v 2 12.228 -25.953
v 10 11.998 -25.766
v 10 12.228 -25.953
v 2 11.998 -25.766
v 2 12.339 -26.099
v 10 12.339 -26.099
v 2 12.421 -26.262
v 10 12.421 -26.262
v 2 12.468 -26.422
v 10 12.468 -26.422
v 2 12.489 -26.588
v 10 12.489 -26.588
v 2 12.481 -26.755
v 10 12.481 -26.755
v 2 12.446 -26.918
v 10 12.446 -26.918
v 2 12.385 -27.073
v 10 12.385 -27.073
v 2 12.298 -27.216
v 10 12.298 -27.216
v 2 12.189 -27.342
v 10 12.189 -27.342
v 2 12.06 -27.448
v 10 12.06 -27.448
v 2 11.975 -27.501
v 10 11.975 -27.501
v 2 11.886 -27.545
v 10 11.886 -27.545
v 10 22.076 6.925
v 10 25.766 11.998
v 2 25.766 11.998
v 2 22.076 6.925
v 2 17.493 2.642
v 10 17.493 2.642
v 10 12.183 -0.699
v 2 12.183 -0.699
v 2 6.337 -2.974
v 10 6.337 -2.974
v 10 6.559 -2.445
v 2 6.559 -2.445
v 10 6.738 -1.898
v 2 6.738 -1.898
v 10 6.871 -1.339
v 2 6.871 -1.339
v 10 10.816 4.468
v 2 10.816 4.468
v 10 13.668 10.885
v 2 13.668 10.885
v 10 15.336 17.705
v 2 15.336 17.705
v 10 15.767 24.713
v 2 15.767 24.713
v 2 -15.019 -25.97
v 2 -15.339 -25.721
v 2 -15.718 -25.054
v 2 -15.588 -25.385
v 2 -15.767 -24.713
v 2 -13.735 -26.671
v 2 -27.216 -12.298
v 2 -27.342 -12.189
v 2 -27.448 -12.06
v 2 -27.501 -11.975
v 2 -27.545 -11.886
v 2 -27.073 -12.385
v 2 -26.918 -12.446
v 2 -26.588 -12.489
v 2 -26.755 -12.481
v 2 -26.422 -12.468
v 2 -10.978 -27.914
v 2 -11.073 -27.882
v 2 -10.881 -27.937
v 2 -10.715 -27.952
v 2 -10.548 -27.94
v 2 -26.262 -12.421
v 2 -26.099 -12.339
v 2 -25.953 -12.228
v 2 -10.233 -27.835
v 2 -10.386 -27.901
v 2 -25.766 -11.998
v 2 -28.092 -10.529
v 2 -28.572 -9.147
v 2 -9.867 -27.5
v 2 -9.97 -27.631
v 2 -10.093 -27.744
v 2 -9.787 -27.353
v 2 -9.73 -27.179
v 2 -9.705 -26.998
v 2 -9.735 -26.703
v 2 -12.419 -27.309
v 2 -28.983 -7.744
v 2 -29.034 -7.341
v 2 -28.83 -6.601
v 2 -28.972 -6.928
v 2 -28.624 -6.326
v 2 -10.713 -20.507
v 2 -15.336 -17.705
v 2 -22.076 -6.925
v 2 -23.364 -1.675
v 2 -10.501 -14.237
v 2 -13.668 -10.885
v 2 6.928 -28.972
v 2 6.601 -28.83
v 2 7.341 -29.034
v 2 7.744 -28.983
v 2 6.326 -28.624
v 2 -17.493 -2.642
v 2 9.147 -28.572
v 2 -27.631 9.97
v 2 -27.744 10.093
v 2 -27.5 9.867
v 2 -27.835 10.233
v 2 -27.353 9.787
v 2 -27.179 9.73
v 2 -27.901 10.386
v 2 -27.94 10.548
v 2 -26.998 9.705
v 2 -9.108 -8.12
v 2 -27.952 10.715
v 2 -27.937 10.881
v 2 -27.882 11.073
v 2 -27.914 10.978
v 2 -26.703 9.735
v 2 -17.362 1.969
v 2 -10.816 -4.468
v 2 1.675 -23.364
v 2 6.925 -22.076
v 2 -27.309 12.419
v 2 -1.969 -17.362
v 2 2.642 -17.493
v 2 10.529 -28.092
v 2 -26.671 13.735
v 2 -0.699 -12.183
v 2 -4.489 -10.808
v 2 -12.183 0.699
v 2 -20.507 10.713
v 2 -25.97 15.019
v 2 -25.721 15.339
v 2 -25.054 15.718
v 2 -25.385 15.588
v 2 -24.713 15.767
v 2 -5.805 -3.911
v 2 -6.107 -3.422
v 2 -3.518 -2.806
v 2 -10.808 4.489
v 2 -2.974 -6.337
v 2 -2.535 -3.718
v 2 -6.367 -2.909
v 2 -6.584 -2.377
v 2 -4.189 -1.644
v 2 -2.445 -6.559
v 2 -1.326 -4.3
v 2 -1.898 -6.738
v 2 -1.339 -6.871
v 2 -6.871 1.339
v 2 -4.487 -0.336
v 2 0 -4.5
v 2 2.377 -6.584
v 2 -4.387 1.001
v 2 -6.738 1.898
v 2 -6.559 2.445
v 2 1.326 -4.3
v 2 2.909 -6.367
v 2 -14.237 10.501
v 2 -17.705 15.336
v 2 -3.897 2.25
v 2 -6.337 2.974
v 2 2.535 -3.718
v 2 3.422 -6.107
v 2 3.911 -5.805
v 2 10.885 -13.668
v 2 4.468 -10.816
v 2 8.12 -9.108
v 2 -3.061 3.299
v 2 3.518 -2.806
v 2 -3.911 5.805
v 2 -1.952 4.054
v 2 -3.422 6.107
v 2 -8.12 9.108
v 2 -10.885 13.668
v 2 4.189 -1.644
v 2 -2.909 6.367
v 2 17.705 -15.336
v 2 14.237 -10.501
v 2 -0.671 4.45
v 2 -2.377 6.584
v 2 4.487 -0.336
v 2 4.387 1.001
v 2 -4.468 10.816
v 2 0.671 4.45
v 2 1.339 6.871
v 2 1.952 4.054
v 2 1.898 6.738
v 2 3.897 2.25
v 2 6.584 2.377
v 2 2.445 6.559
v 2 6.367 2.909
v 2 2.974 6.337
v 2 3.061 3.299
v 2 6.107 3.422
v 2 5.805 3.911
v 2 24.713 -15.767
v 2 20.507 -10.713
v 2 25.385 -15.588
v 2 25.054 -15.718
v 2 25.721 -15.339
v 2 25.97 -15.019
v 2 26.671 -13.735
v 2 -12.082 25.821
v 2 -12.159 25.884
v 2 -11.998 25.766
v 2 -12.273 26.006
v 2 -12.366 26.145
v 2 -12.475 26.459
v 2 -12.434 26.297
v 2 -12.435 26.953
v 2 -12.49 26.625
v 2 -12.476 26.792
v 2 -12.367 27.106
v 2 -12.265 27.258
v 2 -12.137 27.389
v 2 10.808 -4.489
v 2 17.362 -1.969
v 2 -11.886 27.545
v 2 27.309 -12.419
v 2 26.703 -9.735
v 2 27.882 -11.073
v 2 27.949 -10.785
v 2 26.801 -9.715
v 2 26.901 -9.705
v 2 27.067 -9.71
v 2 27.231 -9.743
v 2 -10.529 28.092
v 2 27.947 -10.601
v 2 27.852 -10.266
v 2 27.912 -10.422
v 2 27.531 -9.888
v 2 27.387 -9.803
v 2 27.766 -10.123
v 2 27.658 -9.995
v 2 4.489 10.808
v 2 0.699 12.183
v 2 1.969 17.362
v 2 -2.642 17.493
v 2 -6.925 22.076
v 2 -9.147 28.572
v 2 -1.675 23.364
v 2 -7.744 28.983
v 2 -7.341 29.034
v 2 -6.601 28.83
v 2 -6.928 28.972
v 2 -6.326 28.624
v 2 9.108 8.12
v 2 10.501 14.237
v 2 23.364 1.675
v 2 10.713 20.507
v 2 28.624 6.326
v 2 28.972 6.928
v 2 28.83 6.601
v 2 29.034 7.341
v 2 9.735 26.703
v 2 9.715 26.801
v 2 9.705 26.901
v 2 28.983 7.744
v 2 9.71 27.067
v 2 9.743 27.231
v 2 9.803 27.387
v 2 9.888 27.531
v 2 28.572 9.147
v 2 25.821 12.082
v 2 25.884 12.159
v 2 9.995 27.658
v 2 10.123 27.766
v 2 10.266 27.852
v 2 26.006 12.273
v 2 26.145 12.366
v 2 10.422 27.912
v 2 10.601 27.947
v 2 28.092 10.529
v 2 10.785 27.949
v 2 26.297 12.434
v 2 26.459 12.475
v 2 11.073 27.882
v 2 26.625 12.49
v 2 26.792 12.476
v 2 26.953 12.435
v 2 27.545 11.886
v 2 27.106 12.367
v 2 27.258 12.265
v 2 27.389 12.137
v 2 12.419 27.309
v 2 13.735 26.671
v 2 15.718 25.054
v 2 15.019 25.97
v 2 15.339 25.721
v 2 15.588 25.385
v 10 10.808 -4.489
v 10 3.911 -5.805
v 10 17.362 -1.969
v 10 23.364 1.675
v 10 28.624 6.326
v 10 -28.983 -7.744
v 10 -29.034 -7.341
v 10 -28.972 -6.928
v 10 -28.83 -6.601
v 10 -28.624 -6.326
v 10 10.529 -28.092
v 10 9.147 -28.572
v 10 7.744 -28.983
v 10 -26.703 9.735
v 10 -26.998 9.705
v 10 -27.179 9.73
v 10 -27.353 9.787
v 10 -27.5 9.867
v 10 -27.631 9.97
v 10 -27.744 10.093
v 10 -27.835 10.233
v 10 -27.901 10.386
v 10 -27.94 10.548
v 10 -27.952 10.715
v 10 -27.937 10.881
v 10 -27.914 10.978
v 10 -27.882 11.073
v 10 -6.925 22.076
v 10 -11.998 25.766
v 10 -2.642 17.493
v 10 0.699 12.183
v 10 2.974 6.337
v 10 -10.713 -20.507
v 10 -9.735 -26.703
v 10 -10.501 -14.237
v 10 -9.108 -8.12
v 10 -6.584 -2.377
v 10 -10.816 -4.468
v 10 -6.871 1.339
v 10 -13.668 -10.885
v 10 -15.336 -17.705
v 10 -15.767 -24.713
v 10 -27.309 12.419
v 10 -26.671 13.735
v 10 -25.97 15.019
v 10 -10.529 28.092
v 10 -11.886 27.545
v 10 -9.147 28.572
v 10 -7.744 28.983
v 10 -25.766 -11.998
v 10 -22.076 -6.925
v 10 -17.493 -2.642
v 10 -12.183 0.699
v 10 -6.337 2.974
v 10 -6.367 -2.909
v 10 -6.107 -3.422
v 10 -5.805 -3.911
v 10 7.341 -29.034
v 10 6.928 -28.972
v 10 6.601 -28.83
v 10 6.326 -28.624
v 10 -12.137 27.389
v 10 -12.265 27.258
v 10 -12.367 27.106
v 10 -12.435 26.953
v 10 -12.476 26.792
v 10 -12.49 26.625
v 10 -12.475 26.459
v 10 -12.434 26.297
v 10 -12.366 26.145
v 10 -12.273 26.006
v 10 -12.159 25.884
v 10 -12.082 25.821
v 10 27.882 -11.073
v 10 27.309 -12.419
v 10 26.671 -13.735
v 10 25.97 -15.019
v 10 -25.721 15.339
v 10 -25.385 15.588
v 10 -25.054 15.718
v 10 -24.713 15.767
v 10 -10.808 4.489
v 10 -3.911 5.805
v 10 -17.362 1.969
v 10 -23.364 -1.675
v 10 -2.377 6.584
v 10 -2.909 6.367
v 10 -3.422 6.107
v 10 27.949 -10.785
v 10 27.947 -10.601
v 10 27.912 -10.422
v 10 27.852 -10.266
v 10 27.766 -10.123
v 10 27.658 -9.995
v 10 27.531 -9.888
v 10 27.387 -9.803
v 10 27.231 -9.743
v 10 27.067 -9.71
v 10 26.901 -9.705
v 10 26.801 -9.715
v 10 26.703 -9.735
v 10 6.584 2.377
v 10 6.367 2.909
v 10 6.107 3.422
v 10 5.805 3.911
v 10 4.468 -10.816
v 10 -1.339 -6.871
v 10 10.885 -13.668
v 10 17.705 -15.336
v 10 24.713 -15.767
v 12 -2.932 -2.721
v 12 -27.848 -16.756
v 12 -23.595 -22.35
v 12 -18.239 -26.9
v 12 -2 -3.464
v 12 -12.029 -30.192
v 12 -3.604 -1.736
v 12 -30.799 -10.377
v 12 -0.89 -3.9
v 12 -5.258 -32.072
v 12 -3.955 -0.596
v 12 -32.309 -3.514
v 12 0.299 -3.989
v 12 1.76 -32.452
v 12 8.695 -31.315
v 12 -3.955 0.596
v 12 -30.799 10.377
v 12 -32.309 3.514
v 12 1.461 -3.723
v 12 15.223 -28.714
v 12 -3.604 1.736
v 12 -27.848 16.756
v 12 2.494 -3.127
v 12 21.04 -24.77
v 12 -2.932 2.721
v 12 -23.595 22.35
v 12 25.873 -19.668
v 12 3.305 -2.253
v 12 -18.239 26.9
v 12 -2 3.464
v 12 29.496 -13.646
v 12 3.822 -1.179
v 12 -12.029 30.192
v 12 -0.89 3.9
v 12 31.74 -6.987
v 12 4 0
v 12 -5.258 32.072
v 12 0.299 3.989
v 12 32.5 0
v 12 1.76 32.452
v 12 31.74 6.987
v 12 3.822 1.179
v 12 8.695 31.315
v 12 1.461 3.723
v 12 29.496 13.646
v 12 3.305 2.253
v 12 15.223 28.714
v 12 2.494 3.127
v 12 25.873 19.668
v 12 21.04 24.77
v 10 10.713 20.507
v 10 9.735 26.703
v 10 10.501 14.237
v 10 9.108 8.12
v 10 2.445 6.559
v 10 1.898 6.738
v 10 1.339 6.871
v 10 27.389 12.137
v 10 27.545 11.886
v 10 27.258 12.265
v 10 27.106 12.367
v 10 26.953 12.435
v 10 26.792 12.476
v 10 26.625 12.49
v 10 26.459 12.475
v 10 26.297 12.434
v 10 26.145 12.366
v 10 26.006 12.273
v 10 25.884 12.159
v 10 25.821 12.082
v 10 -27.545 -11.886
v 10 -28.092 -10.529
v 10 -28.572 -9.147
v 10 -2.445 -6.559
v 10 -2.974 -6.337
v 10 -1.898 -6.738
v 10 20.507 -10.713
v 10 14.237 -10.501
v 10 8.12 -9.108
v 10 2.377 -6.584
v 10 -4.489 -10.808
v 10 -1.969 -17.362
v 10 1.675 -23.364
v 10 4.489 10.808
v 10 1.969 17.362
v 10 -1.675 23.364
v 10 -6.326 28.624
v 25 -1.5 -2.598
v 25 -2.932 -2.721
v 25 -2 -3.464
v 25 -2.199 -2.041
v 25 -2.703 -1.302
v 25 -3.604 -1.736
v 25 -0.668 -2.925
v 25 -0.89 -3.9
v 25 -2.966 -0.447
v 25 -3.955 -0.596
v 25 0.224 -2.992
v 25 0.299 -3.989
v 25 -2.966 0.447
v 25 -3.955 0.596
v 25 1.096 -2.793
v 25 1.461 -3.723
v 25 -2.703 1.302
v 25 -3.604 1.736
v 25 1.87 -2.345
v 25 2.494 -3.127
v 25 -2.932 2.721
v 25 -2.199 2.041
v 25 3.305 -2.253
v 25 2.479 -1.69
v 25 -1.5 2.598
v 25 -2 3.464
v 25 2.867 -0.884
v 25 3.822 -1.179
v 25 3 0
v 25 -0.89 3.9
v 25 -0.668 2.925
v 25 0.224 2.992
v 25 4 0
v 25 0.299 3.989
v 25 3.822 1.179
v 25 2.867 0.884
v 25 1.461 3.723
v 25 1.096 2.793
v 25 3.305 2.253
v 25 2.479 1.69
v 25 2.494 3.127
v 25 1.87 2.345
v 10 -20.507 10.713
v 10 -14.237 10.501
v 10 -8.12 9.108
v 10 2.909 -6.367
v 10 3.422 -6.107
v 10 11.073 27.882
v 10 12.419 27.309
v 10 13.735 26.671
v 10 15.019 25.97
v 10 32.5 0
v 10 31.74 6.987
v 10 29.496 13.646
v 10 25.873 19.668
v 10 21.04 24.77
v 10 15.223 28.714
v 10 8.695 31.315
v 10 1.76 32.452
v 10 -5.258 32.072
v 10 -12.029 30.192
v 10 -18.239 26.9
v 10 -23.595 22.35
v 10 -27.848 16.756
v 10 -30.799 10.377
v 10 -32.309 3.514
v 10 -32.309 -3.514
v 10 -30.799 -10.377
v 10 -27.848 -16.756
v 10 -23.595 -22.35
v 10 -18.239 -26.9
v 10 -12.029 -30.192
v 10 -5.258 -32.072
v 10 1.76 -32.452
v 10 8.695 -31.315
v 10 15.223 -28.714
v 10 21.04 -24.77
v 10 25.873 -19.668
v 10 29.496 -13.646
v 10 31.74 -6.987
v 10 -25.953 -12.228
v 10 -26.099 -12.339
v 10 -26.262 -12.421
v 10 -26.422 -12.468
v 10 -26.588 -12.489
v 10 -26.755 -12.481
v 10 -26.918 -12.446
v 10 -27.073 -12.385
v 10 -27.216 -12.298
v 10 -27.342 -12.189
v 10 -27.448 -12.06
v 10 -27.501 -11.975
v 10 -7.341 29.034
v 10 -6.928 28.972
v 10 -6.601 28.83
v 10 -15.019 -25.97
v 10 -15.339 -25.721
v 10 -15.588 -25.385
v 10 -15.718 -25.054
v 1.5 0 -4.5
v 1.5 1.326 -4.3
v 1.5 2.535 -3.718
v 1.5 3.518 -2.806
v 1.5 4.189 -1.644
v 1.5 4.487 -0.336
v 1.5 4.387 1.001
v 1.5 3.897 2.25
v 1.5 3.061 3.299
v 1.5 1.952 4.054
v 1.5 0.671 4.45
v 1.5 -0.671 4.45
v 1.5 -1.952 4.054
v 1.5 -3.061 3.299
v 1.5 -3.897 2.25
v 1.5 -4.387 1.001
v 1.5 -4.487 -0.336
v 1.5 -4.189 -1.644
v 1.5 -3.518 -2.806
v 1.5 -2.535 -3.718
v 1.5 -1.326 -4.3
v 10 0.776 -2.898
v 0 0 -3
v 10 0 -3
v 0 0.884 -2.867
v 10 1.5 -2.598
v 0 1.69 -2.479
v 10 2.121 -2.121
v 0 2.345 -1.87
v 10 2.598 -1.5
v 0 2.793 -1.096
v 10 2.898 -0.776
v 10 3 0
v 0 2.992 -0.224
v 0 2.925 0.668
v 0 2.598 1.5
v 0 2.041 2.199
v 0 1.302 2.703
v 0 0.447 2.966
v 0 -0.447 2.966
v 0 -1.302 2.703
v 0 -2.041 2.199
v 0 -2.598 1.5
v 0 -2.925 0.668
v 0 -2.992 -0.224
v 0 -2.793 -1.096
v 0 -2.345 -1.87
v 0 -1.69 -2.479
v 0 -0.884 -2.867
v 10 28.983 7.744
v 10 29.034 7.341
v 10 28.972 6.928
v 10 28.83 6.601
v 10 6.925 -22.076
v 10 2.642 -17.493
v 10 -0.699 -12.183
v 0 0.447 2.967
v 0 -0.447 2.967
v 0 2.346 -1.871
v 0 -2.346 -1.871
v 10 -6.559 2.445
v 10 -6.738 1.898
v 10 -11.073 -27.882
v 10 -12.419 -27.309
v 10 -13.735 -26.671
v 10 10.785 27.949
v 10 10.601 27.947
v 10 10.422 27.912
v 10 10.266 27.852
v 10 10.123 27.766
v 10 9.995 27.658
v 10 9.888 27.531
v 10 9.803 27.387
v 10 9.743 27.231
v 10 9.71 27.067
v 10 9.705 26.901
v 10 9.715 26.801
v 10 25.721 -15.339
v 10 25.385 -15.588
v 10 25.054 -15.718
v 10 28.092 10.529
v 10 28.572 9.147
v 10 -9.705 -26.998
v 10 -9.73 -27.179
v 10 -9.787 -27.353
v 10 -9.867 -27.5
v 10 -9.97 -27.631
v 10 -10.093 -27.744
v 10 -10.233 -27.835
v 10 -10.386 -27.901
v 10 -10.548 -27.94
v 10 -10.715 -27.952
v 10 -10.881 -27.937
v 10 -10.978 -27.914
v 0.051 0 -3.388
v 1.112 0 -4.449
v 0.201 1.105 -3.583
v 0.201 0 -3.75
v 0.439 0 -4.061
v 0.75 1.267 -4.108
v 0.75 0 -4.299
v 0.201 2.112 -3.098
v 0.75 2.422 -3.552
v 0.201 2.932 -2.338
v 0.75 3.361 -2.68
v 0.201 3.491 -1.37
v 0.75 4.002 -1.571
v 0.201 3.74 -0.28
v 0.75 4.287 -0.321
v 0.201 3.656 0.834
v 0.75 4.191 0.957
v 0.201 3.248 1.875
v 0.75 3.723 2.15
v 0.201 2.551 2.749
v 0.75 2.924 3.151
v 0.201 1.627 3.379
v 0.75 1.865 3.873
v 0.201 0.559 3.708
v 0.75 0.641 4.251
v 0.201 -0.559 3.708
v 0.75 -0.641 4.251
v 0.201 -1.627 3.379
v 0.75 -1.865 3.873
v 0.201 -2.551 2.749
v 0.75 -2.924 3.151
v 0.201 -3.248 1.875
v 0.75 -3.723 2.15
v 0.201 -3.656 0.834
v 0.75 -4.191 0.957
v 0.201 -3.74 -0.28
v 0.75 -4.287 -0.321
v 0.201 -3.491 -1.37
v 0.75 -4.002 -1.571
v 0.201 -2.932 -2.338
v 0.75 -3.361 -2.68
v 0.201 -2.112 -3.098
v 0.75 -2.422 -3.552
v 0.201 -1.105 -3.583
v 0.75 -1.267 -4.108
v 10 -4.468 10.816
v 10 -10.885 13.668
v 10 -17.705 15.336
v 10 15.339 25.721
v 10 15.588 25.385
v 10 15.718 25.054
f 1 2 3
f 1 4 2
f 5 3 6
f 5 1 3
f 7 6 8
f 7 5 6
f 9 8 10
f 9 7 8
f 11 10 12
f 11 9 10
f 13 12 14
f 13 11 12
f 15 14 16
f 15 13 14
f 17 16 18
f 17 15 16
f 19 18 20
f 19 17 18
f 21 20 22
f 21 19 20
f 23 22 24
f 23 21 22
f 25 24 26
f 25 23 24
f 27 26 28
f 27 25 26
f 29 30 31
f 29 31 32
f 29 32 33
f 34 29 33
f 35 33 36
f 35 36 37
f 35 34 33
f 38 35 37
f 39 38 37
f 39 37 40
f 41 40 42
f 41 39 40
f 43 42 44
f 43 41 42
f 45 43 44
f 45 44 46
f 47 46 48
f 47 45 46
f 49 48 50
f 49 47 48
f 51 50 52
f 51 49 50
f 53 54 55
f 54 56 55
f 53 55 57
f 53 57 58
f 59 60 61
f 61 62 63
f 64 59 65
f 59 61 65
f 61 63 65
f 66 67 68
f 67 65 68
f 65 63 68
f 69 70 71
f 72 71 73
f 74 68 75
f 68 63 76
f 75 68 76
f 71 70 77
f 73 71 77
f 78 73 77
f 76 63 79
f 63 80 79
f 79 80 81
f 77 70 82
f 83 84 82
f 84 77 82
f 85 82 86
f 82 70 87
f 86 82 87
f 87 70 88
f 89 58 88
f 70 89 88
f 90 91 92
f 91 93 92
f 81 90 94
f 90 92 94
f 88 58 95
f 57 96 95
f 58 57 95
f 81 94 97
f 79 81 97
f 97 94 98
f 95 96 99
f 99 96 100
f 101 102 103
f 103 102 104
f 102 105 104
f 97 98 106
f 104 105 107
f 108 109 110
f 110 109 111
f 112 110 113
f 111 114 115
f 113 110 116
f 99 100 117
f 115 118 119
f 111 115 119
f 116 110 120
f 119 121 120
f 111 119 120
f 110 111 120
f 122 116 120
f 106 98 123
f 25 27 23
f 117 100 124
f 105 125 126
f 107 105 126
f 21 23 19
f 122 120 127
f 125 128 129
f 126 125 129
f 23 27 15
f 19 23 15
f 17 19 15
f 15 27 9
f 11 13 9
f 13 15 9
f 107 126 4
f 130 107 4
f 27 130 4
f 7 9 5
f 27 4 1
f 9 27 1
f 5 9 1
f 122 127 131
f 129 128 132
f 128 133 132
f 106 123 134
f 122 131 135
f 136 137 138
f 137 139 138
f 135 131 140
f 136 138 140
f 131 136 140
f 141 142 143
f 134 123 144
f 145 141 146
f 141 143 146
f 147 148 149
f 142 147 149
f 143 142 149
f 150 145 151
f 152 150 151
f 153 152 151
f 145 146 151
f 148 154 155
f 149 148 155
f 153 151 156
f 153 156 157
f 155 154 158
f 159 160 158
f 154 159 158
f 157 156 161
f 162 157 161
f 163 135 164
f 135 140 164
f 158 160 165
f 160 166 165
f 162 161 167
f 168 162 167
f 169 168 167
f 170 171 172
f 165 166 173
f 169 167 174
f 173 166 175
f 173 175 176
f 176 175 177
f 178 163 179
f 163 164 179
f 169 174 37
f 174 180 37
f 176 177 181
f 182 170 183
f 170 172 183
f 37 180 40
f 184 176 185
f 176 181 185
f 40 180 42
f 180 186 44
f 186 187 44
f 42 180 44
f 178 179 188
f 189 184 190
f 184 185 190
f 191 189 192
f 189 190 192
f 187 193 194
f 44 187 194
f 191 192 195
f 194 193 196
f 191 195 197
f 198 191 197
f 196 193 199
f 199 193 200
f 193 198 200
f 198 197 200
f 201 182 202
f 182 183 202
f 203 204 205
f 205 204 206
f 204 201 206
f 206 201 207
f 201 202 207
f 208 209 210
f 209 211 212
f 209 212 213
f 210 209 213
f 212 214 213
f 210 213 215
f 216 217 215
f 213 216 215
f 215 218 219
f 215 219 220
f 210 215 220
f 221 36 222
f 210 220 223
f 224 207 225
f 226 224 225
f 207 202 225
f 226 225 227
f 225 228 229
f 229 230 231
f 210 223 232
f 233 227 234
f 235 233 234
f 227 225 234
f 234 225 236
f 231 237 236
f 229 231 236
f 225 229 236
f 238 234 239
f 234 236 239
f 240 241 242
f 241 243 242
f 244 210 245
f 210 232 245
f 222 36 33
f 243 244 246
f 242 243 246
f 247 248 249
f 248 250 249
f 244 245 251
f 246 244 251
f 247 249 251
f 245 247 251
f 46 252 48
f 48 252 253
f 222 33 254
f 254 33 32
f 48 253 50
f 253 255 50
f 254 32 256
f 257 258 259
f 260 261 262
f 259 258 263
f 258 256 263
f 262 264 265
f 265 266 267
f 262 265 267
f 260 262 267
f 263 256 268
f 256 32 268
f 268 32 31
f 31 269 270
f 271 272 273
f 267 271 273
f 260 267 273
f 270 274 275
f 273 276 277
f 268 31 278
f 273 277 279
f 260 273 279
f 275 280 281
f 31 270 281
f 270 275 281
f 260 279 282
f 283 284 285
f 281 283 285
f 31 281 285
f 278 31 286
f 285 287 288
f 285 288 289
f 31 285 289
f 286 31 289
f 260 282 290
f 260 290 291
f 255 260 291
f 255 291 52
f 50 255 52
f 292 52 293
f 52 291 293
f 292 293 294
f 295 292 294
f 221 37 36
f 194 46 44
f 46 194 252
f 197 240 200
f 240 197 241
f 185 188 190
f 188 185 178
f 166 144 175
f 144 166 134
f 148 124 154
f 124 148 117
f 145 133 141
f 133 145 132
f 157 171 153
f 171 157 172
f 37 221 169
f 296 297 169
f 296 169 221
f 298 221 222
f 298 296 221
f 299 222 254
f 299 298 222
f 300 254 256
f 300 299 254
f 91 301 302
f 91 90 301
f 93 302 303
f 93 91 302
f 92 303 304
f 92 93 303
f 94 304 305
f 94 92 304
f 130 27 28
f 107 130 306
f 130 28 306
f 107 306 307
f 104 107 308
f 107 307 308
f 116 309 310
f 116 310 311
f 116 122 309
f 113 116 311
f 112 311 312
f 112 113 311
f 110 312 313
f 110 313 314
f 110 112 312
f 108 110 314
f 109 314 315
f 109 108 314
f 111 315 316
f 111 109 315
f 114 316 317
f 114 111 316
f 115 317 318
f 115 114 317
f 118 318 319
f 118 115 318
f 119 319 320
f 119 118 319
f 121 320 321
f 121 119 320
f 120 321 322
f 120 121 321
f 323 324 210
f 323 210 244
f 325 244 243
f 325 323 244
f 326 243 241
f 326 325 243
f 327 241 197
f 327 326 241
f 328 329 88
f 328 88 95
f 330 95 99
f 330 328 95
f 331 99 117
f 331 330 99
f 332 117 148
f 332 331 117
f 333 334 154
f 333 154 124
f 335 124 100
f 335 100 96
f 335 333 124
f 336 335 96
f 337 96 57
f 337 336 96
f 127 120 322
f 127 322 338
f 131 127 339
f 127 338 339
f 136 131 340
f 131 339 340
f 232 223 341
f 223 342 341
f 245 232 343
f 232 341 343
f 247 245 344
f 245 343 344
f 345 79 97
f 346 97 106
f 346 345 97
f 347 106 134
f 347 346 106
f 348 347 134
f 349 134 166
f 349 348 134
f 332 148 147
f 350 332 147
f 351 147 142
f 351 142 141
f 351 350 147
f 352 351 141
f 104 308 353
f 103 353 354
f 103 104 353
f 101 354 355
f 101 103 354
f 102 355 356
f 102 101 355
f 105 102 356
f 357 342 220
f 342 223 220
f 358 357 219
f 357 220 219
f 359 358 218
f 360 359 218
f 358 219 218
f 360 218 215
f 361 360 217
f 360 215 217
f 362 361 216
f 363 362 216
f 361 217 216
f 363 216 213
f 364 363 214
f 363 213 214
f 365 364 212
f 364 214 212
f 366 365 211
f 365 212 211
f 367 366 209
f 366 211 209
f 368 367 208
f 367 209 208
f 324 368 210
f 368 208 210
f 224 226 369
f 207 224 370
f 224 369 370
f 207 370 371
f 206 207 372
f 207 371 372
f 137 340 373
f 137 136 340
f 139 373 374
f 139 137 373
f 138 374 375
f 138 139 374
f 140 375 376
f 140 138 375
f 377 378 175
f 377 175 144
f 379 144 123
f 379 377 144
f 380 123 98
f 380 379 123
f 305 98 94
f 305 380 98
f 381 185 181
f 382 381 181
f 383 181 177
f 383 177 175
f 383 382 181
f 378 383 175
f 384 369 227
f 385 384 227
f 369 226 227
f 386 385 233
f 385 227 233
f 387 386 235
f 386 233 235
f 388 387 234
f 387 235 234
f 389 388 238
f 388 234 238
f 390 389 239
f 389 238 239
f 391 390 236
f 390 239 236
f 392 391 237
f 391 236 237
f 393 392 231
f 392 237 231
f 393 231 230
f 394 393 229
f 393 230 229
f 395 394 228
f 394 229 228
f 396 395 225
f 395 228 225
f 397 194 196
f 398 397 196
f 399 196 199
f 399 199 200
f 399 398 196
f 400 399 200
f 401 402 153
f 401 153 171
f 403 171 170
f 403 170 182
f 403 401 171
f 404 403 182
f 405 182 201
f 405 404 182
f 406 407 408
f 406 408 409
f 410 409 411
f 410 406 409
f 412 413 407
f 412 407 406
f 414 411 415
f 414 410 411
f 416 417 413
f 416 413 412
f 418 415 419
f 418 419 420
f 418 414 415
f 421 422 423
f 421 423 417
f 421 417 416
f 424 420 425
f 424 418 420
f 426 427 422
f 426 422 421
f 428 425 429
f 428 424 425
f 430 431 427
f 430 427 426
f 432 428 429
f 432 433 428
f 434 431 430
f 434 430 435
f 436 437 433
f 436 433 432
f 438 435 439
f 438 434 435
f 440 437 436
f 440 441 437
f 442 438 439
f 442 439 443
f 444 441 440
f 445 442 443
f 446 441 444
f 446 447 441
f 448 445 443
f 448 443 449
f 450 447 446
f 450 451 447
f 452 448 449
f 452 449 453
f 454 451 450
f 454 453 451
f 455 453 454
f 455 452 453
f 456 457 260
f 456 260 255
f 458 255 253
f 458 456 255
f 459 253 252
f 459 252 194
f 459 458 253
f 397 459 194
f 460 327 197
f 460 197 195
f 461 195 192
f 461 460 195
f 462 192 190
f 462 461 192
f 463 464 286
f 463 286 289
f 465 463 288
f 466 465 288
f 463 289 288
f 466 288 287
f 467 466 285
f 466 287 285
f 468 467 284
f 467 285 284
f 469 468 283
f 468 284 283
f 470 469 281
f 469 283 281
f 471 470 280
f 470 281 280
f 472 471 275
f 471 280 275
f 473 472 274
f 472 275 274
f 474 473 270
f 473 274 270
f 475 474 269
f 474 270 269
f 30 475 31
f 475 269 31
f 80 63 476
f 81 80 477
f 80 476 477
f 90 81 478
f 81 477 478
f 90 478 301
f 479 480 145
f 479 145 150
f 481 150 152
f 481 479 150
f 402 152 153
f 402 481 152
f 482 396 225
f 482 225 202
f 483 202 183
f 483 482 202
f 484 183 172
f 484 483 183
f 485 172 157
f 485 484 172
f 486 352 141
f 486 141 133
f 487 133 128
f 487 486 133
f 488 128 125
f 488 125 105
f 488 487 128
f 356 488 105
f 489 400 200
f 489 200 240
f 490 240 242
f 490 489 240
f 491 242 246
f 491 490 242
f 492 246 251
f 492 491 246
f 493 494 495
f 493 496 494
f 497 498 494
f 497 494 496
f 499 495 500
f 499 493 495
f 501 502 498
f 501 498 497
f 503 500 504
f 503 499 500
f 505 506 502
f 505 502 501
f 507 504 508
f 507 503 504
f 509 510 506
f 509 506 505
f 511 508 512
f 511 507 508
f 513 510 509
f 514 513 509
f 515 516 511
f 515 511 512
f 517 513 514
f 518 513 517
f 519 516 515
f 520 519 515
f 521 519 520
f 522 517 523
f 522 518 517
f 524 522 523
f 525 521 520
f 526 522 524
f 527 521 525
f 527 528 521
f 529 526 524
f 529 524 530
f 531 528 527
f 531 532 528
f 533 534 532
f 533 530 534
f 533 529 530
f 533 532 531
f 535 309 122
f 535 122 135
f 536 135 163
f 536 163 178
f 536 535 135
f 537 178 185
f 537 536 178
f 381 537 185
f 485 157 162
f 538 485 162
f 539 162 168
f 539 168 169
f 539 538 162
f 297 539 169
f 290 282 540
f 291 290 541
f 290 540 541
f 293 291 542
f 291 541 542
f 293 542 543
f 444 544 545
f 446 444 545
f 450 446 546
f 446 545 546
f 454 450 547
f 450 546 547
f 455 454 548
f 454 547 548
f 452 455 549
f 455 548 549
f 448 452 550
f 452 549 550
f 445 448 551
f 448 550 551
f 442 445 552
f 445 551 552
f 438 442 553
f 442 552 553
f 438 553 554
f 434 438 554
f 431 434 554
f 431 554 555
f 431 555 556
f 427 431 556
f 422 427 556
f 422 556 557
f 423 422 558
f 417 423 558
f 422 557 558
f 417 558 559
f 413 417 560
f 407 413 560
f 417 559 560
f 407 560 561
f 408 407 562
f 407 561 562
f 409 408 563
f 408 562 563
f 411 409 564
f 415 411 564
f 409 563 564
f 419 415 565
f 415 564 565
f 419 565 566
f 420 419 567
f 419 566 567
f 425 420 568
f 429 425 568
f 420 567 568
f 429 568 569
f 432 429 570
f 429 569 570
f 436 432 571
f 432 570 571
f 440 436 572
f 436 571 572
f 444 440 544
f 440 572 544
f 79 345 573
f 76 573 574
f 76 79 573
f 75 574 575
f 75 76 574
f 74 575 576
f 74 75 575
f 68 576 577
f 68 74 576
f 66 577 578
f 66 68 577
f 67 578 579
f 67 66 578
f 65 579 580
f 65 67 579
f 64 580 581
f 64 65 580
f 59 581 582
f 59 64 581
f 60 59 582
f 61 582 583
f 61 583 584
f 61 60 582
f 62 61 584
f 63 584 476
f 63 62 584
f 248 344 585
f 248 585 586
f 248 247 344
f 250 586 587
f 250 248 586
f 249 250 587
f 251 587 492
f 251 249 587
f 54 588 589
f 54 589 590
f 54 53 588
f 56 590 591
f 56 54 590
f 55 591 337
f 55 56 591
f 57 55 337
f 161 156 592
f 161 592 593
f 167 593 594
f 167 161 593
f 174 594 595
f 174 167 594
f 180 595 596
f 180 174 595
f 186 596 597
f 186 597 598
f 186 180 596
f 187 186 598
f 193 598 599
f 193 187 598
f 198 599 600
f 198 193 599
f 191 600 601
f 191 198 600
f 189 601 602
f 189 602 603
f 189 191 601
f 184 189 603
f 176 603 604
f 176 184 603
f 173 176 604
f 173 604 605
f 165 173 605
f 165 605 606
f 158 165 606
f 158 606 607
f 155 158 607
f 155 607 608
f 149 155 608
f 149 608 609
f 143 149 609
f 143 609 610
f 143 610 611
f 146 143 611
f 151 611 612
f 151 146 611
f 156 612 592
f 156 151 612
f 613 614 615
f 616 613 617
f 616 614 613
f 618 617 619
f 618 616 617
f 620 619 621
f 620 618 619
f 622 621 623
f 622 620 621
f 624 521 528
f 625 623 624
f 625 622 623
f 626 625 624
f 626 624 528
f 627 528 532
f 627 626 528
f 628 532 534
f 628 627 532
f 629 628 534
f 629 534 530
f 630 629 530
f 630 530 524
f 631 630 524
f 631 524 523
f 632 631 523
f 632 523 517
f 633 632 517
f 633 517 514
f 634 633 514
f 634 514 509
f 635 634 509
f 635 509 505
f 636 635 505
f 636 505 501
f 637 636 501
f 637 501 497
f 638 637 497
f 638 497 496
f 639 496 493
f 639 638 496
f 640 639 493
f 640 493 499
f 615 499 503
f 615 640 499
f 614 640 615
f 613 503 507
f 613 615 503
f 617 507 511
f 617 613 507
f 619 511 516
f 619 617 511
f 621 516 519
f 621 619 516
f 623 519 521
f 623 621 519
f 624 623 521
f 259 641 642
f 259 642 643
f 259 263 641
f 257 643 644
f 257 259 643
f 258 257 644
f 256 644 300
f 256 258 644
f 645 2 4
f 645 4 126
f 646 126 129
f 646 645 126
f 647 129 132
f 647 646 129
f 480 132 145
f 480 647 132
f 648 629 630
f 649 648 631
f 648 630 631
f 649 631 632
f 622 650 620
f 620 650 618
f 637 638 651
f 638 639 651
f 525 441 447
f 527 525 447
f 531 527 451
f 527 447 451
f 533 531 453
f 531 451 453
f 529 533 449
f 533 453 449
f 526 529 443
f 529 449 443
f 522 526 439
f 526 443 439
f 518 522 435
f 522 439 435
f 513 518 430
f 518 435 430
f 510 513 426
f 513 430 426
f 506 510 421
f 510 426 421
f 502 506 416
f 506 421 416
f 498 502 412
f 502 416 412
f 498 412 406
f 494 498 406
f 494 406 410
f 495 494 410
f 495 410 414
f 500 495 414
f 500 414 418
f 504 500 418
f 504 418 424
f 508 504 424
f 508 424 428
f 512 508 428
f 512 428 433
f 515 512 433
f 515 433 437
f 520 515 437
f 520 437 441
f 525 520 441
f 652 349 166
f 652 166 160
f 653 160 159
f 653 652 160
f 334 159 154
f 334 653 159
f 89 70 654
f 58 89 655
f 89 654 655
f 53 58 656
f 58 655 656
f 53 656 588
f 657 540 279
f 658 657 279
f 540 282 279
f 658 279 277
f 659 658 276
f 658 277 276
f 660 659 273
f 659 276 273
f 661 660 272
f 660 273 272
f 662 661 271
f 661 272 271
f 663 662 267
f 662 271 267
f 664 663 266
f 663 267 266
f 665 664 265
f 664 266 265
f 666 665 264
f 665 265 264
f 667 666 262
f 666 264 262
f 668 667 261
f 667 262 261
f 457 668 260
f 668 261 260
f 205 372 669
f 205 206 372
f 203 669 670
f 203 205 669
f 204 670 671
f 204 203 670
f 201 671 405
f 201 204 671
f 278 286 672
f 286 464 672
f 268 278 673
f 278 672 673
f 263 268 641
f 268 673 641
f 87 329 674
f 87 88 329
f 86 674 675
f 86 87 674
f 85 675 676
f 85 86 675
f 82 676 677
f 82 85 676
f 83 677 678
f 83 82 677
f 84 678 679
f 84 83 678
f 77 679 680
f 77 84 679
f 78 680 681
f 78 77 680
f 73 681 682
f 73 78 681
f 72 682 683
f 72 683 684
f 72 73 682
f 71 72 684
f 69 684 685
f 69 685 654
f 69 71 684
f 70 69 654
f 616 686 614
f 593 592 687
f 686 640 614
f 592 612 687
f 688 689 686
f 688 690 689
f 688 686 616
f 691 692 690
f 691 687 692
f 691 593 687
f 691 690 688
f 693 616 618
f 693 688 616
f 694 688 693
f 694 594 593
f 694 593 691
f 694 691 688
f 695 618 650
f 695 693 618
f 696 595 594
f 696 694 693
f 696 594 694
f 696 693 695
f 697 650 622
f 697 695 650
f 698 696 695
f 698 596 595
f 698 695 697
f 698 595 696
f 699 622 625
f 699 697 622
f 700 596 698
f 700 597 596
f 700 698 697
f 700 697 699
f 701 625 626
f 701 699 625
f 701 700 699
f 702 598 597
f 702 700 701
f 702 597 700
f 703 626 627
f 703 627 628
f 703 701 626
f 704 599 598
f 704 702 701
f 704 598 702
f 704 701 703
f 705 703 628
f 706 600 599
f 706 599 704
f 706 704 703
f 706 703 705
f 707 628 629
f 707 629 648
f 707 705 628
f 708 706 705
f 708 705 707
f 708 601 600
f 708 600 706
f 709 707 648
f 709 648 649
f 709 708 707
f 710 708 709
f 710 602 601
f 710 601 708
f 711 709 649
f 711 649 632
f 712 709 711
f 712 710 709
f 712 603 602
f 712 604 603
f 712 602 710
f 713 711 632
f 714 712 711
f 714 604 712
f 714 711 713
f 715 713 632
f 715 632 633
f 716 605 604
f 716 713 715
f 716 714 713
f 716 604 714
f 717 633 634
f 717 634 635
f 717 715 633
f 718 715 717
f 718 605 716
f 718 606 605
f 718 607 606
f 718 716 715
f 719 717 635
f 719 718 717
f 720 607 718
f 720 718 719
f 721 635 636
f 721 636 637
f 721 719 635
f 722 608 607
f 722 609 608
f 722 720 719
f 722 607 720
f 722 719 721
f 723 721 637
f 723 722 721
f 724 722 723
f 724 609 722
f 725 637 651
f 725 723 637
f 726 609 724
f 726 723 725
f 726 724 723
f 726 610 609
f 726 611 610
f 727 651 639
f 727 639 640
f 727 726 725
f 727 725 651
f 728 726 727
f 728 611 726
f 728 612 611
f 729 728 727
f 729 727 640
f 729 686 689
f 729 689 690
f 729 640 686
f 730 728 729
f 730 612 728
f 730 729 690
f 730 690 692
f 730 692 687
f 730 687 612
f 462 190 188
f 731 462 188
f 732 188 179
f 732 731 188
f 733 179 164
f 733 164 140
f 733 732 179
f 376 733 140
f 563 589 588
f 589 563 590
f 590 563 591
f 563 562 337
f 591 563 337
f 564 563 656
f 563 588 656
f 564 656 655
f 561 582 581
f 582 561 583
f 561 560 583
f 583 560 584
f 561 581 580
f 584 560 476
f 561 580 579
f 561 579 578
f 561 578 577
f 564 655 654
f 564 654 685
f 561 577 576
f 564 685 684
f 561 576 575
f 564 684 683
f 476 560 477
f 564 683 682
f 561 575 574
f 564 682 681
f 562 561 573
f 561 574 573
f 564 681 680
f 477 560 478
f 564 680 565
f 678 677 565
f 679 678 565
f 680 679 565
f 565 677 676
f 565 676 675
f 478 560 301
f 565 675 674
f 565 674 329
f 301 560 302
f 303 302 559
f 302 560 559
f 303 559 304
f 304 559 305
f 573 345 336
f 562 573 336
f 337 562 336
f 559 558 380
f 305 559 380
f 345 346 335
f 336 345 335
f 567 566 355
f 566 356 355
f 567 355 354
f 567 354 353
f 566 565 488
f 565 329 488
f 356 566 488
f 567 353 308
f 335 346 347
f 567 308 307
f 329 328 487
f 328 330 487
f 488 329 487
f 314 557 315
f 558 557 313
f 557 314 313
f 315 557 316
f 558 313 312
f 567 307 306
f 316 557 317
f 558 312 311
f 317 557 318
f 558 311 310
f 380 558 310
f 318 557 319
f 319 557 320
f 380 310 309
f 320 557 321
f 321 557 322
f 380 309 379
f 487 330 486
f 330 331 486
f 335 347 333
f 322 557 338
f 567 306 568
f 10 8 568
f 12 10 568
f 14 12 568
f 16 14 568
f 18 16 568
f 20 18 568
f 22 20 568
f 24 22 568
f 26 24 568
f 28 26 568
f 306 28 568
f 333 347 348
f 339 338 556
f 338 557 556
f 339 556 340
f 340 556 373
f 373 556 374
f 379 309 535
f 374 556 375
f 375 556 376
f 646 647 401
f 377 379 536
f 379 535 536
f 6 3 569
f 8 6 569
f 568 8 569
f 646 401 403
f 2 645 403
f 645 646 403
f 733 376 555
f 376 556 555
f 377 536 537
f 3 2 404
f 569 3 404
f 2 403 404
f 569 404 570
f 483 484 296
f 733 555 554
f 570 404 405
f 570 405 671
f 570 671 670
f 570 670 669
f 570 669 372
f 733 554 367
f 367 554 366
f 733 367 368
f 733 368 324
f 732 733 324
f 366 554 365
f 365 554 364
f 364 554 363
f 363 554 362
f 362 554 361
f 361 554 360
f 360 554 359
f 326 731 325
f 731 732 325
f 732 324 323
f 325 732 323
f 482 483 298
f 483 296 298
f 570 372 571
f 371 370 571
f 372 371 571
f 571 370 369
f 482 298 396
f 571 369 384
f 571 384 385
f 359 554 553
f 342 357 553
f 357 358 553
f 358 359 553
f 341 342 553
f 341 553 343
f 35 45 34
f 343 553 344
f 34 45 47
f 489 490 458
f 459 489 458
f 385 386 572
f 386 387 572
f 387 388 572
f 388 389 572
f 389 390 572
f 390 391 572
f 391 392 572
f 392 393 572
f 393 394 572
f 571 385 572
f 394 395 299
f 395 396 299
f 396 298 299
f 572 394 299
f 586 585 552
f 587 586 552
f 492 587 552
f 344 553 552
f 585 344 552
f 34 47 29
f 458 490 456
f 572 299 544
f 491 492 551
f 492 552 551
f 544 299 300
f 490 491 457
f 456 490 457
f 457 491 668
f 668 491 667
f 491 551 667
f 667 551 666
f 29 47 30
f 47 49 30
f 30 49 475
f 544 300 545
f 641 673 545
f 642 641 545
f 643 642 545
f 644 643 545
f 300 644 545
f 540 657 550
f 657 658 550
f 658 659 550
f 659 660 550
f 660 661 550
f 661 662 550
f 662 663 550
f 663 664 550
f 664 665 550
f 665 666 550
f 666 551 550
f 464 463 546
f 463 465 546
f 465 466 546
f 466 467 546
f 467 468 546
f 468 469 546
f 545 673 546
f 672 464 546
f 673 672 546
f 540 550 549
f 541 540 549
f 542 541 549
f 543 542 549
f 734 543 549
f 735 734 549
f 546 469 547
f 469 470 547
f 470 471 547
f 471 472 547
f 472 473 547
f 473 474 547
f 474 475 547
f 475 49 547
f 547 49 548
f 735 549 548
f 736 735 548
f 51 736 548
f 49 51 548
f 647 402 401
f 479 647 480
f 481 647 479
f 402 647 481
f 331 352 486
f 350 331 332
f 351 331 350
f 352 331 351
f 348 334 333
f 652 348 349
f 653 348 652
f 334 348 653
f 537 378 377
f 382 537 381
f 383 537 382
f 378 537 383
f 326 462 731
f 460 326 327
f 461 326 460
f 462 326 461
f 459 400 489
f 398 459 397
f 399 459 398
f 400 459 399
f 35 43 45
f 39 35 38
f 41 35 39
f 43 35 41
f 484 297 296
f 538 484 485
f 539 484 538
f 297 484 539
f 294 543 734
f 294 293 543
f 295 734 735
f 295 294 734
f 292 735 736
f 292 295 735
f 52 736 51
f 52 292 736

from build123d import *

# Parameters (mm, degrees)
SKETCH3_W           = 10
SKETCH3_H           = 30
SKETCH4_R           = 3
CUT_EXTRUDE2_DEPTH  = 10
CUT_EXTRUDE3_START  = 2
SKETCH5_R           = 30
SKETCH5_R_2         = 4.5
CUT_EXTRUDE3_DEPTH  = 2
FILLET2_R           = 1.5
CUT_EXTRUDE6_START  = -8
CUT_EXTRUDE6_DEPTH  = 8
FILLET3_R           = 1.5
FILLET4_R           = 1
SKETCH11_R          = 32.5
SKETCH11_R_2        = 3
BOSS_EXTRUDE4_DEPTH = 2
SKETCH12_R          = 4
SKETCH12_R_2        = 3
BOSS_EXTRUDE5_DEPTH = 15


with BuildPart() as part:
    # Sketch3 → Revolve3 (revolve)
    with BuildSketch(Plane.XY):
        with Locations((5, 15)):
            Rectangle(SKETCH3_W, SKETCH3_H)
    revolve(axis=Axis((10, 0, 0), (-1, 0, 0)))

    # Sketch4 → Cut-Extrude2 (cut)
    with BuildSketch(Plane(origin=(0, 0, 0), x_dir=(0, 0, -1), z_dir=(1, 0, 0))):
        Circle(SKETCH4_R)
    extrude(amount=CUT_EXTRUDE2_DEPTH, mode=Mode.SUBTRACT)

    # Sketch5 → Cut-Extrude3 (cut)
    with BuildSketch(Plane(origin=(0, 0, 0), x_dir=(0, 0, -1), z_dir=(1, 0, 0)).offset(CUT_EXTRUDE3_START)):
        with Locations(Location((0, 0, 0), (0, 0, 90))):
            Circle(SKETCH5_R)
        Circle(SKETCH5_R_2, mode=Mode.SUBTRACT)
    extrude(amount=-CUT_EXTRUDE3_DEPTH, mode=Mode.SUBTRACT)

    # Fillet2
    fillet2_edges = [part.edges().sort_by_distance(p)[0] for p in [
        (0, 0, 4.5),
    ]]
    fillet(fillet2_edges, radius=FILLET2_R - 0.0001)  # a hair under: the kernel refuses the full size

    # Sketch6 → Cut-Extrude6 (cut)
    with BuildSketch(Plane.ZY.offset(-2).offset(CUT_EXTRUDE6_START)):
        with BuildLine():
            ThreePointArc((-3.911197191, -5.805388577), (-17.732937141, -1.783831627), (-29.187621061, 6.934174556))
            ThreePointArc((-29.187621061, 6.934174556), (-29.97689762, -1.177118976), (-28.554011024, -9.201546306))
            ThreePointArc((-28.554011024, -9.201546306), (-15.193906429, -10.611164811), (-2.377494131, -6.583883478))
            ThreePointArc((-2.377494131, -6.583883478), (-3.168347079, -6.241920921), (-3.911197191, -5.805388577))
        make_face()
        with BuildLine():
            ThreePointArc((-6.870663687, -1.339395574), (-13.800439543, 11.277720662), (-15.735562929, 25.54196663))
            ThreePointArc((-15.735562929, 25.54196663), (-22.029216396, 20.364518776), (-26.697210616, 13.684259035))
            ThreePointArc((-26.697210616, 13.684259035), (-18.246940863, 3.240487675), (-6.336650876, -2.974366432))
            ThreePointArc((-6.336650876, -2.974366432), (-6.654064316, -2.173344906), (-6.870663687, -1.339395574))
        make_face()
        with BuildLine():
            ThreePointArc((-25.54196663, -15.735562929), (-20.364518776, -22.029216396), (-13.684259035, -26.697210616))
            ThreePointArc((-13.684259035, -26.697210616), (-3.240487675, -18.246940863), (2.974366432, -6.336650876))
            ThreePointArc((2.974366432, -6.336650876), (2.173344906, -6.654064316), (1.339395574, -6.870663687))
            ThreePointArc((1.339395574, -6.870663687), (-11.277720662, -13.800439543), (-25.54196663, -15.735562929))
        make_face()
        with BuildLine():
            ThreePointArc((-6.934174556, -29.187621061), (1.177118976, -29.97689762), (9.201546306, -28.554011024))
            ThreePointArc((9.201546306, -28.554011024), (10.611164811, -15.193906429), (6.583883478, -2.377494131))
            ThreePointArc((6.583883478, -2.377494131), (6.241920921, -3.168347079), (5.805388577, -3.911197191))
            ThreePointArc((5.805388577, -3.911197191), (1.783831627, -17.732937141), (-6.934174556, -29.187621061))
        make_face()
        with BuildLine():
            ThreePointArc((15.735562929, -25.54196663), (22.029216396, -20.364518776), (26.697210616, -13.684259035))
            ThreePointArc((26.697210616, -13.684259035), (18.246940863, -3.240487675), (6.336650876, 2.974366432))
            ThreePointArc((6.336650876, 2.974366432), (6.654064316, 2.173344906), (6.870663687, 1.339395574))
            ThreePointArc((6.870663687, 1.339395574), (13.800439543, -11.277720662), (15.735562929, -25.54196663))
        make_face()
        with BuildLine():
            ThreePointArc((29.187621061, -6.934174556), (29.796213114, -3.49079992), (30, 0))
            ThreePointArc((30, 0), (29.636298105, 4.657234655), (28.554011024, 9.201546306))
            ThreePointArc((28.554011024, 9.201546306), (15.193906429, 10.611164811), (2.377494131, 6.583883478))
            ThreePointArc((2.377494131, 6.583883478), (3.168347079, 6.241920921), (3.911197191, 5.805388577))
            ThreePointArc((3.911197191, 5.805388577), (17.732937141, 1.783831627), (29.187621061, -6.934174556))
        make_face()
        with BuildLine():
            ThreePointArc((-1.339395574, 6.870663687), (11.277720662, 13.800439543), (25.54196663, 15.735562929))
            ThreePointArc((25.54196663, 15.735562929), (20.364518776, 22.029216396), (13.684259035, 26.697210616))
            ThreePointArc((13.684259035, 26.697210616), (3.240487675, 18.246940863), (-2.974366432, 6.336650876))
            ThreePointArc((-2.974366432, 6.336650876), (-2.173344906, 6.654064316), (-1.339395574, 6.870663687))
        make_face()
        with BuildLine():
            ThreePointArc((-5.805388577, 3.911197191), (-1.783831627, 17.732937141), (6.934174556, 29.187621061))
            ThreePointArc((6.934174556, 29.187621061), (-1.177118976, 29.97689762), (-9.201546306, 28.554011024))
            ThreePointArc((-9.201546306, 28.554011024), (-10.611164811, 15.193906429), (-6.583883478, 2.377494131))
            ThreePointArc((-6.583883478, 2.377494131), (-6.241920921, 3.168347079), (-5.805388577, 3.911197191))
        make_face()
    extrude(amount=CUT_EXTRUDE6_DEPTH, mode=Mode.SUBTRACT)

    # Fillet3
    fillet3_edges = [part.edges().sort_by_distance(p)[0] for p in [
        (6, 15.735562929, 25.54196663),
        (6, 29.187621061, 6.934174556),
        (6, 6.934174556, -29.187621061),
        (6, 25.54196663, -15.735562929),
        (6, -15.735562929, -25.54196663),
        (6, -29.187621061, -6.934174556),
        (6, -25.54196663, 15.735562929),
        (6, -6.934174556, 29.187621061),
    ]]
    fillet(fillet3_edges, radius=FILLET3_R)

    # Fillet4
    fillet4_edges = [part.edges().sort_by_distance(p)[0] for p in [
        (6, 26.697210616, 13.684259035),
        (6, 28.554011024, -9.201546306),
        (6, -9.201546306, -28.554011024),
        (6, 13.684259035, -26.697210616),
        (6, -26.697210616, -13.684259035),
        (6, -28.554011024, 9.201546306),
        (6, -13.684259035, 26.697210616),
        (6, 9.201546306, 28.554011024),
    ]]
    fillet(fillet4_edges, radius=FILLET4_R)

    # Sketch11 → Boss-Extrude4 (add)
    with BuildSketch(Plane(origin=(10, 0, 0), x_dir=(0, 0, -1), z_dir=(1, 0, 0))):
        with Locations(Location((0, 0, 0), (0, 0, 90))):
            Circle(SKETCH11_R)
        with Locations(Location((0, 0, 0), (0, 0, 90))):
            Circle(SKETCH11_R_2, mode=Mode.SUBTRACT)
    extrude(amount=BOSS_EXTRUDE4_DEPTH)

    # Sketch12 → Boss-Extrude5 (add)
    with BuildSketch(Plane(origin=(10, 0, 0), x_dir=(0, 0, -1), z_dir=(1, 0, 0))):
        with Locations(Location((0, 0, 0), (0, 0, 90))):
            Circle(SKETCH12_R)
        with Locations(Location((0, 0, 0), (0, 0, 90))):
            Circle(SKETCH12_R_2, mode=Mode.SUBTRACT)
    extrude(amount=BOSS_EXTRUDE5_DEPTH)


solid = part.part
